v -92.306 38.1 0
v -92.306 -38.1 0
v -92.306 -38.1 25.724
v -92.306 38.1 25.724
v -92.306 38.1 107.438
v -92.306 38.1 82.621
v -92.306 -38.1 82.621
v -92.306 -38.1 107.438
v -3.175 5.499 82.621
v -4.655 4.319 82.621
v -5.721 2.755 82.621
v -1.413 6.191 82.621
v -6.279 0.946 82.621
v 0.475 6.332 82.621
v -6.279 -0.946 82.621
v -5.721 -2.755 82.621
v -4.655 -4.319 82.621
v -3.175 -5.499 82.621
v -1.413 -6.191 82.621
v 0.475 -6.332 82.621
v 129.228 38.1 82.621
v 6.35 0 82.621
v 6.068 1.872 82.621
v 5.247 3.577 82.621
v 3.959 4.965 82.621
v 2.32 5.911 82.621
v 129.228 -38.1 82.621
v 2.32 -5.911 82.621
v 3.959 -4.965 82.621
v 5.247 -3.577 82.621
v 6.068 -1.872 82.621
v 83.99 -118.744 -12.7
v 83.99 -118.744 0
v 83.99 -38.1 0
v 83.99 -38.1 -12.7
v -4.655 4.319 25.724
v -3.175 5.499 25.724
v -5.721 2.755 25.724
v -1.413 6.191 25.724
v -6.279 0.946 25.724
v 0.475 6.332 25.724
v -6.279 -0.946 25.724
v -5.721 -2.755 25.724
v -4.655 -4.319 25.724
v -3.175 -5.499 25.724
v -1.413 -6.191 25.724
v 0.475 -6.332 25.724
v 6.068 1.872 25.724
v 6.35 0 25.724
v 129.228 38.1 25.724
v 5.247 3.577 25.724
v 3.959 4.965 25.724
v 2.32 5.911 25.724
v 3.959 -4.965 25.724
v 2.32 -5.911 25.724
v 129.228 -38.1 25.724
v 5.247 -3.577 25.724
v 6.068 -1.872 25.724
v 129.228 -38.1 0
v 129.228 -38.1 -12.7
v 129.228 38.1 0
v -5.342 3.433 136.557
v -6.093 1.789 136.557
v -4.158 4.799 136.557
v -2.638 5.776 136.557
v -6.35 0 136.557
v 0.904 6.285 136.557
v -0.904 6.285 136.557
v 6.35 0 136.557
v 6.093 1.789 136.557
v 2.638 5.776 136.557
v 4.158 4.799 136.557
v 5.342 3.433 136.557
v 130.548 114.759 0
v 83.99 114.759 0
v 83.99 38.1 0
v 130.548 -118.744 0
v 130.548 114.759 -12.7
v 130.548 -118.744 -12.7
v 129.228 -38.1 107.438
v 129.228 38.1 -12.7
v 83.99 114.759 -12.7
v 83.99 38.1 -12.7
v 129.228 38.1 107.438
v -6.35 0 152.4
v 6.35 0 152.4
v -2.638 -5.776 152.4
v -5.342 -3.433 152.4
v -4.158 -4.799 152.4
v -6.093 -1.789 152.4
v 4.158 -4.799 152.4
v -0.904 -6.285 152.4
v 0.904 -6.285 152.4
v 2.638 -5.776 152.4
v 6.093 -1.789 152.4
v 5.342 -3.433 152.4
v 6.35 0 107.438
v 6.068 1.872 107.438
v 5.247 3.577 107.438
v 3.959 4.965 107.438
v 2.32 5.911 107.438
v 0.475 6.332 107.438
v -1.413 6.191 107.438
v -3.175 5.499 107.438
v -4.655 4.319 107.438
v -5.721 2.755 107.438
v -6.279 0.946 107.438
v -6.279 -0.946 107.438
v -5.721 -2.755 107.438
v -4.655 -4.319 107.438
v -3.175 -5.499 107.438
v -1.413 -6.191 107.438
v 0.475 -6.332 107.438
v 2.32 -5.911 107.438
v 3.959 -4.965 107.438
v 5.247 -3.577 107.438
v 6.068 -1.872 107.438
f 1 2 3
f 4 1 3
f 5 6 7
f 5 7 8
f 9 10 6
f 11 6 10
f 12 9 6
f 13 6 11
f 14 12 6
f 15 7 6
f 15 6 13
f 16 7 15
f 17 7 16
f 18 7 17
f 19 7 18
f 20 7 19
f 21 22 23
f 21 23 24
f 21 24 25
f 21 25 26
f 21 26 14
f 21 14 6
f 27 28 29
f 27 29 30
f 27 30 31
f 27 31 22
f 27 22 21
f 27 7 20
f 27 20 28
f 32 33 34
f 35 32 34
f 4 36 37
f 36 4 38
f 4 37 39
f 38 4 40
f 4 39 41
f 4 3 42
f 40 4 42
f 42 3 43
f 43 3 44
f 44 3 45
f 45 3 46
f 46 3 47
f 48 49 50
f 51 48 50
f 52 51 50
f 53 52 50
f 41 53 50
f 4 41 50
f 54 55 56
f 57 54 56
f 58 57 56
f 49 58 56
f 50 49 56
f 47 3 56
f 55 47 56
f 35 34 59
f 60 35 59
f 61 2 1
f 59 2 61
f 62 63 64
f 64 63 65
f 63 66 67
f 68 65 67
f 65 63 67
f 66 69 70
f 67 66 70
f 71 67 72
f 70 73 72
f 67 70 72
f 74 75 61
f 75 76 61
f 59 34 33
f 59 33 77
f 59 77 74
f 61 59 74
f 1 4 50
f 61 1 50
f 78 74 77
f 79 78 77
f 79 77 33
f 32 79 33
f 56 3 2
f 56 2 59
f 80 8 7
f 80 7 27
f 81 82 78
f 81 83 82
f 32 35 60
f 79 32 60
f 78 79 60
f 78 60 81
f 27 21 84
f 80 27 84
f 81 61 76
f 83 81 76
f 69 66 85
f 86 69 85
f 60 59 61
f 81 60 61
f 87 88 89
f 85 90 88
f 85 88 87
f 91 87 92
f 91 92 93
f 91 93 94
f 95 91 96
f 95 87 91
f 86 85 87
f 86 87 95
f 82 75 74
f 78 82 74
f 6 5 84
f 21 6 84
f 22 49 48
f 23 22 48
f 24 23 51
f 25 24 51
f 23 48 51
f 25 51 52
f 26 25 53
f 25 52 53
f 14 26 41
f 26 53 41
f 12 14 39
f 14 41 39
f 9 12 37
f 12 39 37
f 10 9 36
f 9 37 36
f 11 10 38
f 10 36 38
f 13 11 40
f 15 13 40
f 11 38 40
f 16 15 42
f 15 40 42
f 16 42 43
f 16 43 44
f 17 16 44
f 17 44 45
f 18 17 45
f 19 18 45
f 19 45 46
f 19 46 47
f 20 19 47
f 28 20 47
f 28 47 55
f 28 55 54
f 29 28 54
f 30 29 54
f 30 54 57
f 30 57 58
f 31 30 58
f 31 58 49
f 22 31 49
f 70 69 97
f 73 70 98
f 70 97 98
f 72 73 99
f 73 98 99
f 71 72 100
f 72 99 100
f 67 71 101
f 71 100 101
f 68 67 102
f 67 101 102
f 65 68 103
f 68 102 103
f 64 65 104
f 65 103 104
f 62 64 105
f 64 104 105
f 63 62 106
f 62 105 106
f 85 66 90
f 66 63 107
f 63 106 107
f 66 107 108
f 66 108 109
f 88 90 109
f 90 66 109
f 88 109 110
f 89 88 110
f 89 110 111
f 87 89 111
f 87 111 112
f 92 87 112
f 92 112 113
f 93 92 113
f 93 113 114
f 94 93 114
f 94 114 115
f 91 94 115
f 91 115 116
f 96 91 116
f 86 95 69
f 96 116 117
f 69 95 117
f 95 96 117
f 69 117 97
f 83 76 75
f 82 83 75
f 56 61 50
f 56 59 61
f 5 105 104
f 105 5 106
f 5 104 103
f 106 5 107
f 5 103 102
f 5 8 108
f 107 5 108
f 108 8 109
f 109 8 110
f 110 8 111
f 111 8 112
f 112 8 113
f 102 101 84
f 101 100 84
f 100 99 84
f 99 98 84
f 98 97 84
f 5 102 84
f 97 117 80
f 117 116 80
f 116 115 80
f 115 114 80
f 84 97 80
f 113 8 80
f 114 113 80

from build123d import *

# Parameters (mm, degrees)
F0_R     = 6.35
F1_DEPTH = 152.4
F2_W     = 12.7
F2_H     = 18.046826
F3_DEPTH = 25.4
F4_DEPTH = 25.4
F5_W     = 221.533217
F5_H     = 24.816573
F5_H_2   = 25.724487
F6_DEPTH = 38.1
F7_DEPTH = 38.1
F9_DEPTH = 12.7


with BuildPart() as f1:
    # F0 (on Top) → F1 (new body)
    with BuildSketch(Plane.XY):
        Circle(F0_R)
    extrude(amount=F1_DEPTH)

    # F2 (on Right) → F3 (cut)
    with BuildSketch(Plane.YZ):
        with Locations((6.35, 145.580664)):
            Rectangle(F2_W, F2_H)
    extrude(amount=-F3_DEPTH, mode=Mode.SUBTRACT)

    # F2 (on Right) → F4 (cut)
    with BuildSketch(Plane.YZ):
        with Locations((6.35, 145.580664)):
            Rectangle(F2_W, F2_H)
    extrude(amount=F4_DEPTH, mode=Mode.SUBTRACT)

    # F5 (on Front) → F6 (join)
    with BuildSketch(Plane.XZ):
        with Locations((18.461104, 95.02928)):
            Rectangle(F5_W, F5_H)
        with Locations((18.461104, 12.862243)):
            Rectangle(F5_W, F5_H_2)
    extrude(amount=F6_DEPTH)

    # F5 (on Front) → F7 (join)
    with BuildSketch(Plane.XZ):
        with Locations((18.461104, 95.02928)):
            Rectangle(F5_W, F5_H)
        with Locations((18.461104, 12.862243)):
            Rectangle(F5_W, F5_H_2)
    extrude(amount=-F7_DEPTH)


with BuildPart() as f9:
    # F8 (on face) → F9 (new body)
    with BuildSketch(Plane(origin=(0, 0, 0), x_dir=(1, 0, 0), z_dir=(0, 0, -1))):
        Polygon((83.989941, -114.758618), (130.548141, -114.758618), (130.548141, 118.743582), (83.989941, 118.743582), (83.989941, 38.1), (129.227713, 38.1), (129.227713, -38.1), (83.989941, -38.1), align=None)
    extrude(amount=F9_DEPTH)


solid = Compound([f1.part, f9.part])
